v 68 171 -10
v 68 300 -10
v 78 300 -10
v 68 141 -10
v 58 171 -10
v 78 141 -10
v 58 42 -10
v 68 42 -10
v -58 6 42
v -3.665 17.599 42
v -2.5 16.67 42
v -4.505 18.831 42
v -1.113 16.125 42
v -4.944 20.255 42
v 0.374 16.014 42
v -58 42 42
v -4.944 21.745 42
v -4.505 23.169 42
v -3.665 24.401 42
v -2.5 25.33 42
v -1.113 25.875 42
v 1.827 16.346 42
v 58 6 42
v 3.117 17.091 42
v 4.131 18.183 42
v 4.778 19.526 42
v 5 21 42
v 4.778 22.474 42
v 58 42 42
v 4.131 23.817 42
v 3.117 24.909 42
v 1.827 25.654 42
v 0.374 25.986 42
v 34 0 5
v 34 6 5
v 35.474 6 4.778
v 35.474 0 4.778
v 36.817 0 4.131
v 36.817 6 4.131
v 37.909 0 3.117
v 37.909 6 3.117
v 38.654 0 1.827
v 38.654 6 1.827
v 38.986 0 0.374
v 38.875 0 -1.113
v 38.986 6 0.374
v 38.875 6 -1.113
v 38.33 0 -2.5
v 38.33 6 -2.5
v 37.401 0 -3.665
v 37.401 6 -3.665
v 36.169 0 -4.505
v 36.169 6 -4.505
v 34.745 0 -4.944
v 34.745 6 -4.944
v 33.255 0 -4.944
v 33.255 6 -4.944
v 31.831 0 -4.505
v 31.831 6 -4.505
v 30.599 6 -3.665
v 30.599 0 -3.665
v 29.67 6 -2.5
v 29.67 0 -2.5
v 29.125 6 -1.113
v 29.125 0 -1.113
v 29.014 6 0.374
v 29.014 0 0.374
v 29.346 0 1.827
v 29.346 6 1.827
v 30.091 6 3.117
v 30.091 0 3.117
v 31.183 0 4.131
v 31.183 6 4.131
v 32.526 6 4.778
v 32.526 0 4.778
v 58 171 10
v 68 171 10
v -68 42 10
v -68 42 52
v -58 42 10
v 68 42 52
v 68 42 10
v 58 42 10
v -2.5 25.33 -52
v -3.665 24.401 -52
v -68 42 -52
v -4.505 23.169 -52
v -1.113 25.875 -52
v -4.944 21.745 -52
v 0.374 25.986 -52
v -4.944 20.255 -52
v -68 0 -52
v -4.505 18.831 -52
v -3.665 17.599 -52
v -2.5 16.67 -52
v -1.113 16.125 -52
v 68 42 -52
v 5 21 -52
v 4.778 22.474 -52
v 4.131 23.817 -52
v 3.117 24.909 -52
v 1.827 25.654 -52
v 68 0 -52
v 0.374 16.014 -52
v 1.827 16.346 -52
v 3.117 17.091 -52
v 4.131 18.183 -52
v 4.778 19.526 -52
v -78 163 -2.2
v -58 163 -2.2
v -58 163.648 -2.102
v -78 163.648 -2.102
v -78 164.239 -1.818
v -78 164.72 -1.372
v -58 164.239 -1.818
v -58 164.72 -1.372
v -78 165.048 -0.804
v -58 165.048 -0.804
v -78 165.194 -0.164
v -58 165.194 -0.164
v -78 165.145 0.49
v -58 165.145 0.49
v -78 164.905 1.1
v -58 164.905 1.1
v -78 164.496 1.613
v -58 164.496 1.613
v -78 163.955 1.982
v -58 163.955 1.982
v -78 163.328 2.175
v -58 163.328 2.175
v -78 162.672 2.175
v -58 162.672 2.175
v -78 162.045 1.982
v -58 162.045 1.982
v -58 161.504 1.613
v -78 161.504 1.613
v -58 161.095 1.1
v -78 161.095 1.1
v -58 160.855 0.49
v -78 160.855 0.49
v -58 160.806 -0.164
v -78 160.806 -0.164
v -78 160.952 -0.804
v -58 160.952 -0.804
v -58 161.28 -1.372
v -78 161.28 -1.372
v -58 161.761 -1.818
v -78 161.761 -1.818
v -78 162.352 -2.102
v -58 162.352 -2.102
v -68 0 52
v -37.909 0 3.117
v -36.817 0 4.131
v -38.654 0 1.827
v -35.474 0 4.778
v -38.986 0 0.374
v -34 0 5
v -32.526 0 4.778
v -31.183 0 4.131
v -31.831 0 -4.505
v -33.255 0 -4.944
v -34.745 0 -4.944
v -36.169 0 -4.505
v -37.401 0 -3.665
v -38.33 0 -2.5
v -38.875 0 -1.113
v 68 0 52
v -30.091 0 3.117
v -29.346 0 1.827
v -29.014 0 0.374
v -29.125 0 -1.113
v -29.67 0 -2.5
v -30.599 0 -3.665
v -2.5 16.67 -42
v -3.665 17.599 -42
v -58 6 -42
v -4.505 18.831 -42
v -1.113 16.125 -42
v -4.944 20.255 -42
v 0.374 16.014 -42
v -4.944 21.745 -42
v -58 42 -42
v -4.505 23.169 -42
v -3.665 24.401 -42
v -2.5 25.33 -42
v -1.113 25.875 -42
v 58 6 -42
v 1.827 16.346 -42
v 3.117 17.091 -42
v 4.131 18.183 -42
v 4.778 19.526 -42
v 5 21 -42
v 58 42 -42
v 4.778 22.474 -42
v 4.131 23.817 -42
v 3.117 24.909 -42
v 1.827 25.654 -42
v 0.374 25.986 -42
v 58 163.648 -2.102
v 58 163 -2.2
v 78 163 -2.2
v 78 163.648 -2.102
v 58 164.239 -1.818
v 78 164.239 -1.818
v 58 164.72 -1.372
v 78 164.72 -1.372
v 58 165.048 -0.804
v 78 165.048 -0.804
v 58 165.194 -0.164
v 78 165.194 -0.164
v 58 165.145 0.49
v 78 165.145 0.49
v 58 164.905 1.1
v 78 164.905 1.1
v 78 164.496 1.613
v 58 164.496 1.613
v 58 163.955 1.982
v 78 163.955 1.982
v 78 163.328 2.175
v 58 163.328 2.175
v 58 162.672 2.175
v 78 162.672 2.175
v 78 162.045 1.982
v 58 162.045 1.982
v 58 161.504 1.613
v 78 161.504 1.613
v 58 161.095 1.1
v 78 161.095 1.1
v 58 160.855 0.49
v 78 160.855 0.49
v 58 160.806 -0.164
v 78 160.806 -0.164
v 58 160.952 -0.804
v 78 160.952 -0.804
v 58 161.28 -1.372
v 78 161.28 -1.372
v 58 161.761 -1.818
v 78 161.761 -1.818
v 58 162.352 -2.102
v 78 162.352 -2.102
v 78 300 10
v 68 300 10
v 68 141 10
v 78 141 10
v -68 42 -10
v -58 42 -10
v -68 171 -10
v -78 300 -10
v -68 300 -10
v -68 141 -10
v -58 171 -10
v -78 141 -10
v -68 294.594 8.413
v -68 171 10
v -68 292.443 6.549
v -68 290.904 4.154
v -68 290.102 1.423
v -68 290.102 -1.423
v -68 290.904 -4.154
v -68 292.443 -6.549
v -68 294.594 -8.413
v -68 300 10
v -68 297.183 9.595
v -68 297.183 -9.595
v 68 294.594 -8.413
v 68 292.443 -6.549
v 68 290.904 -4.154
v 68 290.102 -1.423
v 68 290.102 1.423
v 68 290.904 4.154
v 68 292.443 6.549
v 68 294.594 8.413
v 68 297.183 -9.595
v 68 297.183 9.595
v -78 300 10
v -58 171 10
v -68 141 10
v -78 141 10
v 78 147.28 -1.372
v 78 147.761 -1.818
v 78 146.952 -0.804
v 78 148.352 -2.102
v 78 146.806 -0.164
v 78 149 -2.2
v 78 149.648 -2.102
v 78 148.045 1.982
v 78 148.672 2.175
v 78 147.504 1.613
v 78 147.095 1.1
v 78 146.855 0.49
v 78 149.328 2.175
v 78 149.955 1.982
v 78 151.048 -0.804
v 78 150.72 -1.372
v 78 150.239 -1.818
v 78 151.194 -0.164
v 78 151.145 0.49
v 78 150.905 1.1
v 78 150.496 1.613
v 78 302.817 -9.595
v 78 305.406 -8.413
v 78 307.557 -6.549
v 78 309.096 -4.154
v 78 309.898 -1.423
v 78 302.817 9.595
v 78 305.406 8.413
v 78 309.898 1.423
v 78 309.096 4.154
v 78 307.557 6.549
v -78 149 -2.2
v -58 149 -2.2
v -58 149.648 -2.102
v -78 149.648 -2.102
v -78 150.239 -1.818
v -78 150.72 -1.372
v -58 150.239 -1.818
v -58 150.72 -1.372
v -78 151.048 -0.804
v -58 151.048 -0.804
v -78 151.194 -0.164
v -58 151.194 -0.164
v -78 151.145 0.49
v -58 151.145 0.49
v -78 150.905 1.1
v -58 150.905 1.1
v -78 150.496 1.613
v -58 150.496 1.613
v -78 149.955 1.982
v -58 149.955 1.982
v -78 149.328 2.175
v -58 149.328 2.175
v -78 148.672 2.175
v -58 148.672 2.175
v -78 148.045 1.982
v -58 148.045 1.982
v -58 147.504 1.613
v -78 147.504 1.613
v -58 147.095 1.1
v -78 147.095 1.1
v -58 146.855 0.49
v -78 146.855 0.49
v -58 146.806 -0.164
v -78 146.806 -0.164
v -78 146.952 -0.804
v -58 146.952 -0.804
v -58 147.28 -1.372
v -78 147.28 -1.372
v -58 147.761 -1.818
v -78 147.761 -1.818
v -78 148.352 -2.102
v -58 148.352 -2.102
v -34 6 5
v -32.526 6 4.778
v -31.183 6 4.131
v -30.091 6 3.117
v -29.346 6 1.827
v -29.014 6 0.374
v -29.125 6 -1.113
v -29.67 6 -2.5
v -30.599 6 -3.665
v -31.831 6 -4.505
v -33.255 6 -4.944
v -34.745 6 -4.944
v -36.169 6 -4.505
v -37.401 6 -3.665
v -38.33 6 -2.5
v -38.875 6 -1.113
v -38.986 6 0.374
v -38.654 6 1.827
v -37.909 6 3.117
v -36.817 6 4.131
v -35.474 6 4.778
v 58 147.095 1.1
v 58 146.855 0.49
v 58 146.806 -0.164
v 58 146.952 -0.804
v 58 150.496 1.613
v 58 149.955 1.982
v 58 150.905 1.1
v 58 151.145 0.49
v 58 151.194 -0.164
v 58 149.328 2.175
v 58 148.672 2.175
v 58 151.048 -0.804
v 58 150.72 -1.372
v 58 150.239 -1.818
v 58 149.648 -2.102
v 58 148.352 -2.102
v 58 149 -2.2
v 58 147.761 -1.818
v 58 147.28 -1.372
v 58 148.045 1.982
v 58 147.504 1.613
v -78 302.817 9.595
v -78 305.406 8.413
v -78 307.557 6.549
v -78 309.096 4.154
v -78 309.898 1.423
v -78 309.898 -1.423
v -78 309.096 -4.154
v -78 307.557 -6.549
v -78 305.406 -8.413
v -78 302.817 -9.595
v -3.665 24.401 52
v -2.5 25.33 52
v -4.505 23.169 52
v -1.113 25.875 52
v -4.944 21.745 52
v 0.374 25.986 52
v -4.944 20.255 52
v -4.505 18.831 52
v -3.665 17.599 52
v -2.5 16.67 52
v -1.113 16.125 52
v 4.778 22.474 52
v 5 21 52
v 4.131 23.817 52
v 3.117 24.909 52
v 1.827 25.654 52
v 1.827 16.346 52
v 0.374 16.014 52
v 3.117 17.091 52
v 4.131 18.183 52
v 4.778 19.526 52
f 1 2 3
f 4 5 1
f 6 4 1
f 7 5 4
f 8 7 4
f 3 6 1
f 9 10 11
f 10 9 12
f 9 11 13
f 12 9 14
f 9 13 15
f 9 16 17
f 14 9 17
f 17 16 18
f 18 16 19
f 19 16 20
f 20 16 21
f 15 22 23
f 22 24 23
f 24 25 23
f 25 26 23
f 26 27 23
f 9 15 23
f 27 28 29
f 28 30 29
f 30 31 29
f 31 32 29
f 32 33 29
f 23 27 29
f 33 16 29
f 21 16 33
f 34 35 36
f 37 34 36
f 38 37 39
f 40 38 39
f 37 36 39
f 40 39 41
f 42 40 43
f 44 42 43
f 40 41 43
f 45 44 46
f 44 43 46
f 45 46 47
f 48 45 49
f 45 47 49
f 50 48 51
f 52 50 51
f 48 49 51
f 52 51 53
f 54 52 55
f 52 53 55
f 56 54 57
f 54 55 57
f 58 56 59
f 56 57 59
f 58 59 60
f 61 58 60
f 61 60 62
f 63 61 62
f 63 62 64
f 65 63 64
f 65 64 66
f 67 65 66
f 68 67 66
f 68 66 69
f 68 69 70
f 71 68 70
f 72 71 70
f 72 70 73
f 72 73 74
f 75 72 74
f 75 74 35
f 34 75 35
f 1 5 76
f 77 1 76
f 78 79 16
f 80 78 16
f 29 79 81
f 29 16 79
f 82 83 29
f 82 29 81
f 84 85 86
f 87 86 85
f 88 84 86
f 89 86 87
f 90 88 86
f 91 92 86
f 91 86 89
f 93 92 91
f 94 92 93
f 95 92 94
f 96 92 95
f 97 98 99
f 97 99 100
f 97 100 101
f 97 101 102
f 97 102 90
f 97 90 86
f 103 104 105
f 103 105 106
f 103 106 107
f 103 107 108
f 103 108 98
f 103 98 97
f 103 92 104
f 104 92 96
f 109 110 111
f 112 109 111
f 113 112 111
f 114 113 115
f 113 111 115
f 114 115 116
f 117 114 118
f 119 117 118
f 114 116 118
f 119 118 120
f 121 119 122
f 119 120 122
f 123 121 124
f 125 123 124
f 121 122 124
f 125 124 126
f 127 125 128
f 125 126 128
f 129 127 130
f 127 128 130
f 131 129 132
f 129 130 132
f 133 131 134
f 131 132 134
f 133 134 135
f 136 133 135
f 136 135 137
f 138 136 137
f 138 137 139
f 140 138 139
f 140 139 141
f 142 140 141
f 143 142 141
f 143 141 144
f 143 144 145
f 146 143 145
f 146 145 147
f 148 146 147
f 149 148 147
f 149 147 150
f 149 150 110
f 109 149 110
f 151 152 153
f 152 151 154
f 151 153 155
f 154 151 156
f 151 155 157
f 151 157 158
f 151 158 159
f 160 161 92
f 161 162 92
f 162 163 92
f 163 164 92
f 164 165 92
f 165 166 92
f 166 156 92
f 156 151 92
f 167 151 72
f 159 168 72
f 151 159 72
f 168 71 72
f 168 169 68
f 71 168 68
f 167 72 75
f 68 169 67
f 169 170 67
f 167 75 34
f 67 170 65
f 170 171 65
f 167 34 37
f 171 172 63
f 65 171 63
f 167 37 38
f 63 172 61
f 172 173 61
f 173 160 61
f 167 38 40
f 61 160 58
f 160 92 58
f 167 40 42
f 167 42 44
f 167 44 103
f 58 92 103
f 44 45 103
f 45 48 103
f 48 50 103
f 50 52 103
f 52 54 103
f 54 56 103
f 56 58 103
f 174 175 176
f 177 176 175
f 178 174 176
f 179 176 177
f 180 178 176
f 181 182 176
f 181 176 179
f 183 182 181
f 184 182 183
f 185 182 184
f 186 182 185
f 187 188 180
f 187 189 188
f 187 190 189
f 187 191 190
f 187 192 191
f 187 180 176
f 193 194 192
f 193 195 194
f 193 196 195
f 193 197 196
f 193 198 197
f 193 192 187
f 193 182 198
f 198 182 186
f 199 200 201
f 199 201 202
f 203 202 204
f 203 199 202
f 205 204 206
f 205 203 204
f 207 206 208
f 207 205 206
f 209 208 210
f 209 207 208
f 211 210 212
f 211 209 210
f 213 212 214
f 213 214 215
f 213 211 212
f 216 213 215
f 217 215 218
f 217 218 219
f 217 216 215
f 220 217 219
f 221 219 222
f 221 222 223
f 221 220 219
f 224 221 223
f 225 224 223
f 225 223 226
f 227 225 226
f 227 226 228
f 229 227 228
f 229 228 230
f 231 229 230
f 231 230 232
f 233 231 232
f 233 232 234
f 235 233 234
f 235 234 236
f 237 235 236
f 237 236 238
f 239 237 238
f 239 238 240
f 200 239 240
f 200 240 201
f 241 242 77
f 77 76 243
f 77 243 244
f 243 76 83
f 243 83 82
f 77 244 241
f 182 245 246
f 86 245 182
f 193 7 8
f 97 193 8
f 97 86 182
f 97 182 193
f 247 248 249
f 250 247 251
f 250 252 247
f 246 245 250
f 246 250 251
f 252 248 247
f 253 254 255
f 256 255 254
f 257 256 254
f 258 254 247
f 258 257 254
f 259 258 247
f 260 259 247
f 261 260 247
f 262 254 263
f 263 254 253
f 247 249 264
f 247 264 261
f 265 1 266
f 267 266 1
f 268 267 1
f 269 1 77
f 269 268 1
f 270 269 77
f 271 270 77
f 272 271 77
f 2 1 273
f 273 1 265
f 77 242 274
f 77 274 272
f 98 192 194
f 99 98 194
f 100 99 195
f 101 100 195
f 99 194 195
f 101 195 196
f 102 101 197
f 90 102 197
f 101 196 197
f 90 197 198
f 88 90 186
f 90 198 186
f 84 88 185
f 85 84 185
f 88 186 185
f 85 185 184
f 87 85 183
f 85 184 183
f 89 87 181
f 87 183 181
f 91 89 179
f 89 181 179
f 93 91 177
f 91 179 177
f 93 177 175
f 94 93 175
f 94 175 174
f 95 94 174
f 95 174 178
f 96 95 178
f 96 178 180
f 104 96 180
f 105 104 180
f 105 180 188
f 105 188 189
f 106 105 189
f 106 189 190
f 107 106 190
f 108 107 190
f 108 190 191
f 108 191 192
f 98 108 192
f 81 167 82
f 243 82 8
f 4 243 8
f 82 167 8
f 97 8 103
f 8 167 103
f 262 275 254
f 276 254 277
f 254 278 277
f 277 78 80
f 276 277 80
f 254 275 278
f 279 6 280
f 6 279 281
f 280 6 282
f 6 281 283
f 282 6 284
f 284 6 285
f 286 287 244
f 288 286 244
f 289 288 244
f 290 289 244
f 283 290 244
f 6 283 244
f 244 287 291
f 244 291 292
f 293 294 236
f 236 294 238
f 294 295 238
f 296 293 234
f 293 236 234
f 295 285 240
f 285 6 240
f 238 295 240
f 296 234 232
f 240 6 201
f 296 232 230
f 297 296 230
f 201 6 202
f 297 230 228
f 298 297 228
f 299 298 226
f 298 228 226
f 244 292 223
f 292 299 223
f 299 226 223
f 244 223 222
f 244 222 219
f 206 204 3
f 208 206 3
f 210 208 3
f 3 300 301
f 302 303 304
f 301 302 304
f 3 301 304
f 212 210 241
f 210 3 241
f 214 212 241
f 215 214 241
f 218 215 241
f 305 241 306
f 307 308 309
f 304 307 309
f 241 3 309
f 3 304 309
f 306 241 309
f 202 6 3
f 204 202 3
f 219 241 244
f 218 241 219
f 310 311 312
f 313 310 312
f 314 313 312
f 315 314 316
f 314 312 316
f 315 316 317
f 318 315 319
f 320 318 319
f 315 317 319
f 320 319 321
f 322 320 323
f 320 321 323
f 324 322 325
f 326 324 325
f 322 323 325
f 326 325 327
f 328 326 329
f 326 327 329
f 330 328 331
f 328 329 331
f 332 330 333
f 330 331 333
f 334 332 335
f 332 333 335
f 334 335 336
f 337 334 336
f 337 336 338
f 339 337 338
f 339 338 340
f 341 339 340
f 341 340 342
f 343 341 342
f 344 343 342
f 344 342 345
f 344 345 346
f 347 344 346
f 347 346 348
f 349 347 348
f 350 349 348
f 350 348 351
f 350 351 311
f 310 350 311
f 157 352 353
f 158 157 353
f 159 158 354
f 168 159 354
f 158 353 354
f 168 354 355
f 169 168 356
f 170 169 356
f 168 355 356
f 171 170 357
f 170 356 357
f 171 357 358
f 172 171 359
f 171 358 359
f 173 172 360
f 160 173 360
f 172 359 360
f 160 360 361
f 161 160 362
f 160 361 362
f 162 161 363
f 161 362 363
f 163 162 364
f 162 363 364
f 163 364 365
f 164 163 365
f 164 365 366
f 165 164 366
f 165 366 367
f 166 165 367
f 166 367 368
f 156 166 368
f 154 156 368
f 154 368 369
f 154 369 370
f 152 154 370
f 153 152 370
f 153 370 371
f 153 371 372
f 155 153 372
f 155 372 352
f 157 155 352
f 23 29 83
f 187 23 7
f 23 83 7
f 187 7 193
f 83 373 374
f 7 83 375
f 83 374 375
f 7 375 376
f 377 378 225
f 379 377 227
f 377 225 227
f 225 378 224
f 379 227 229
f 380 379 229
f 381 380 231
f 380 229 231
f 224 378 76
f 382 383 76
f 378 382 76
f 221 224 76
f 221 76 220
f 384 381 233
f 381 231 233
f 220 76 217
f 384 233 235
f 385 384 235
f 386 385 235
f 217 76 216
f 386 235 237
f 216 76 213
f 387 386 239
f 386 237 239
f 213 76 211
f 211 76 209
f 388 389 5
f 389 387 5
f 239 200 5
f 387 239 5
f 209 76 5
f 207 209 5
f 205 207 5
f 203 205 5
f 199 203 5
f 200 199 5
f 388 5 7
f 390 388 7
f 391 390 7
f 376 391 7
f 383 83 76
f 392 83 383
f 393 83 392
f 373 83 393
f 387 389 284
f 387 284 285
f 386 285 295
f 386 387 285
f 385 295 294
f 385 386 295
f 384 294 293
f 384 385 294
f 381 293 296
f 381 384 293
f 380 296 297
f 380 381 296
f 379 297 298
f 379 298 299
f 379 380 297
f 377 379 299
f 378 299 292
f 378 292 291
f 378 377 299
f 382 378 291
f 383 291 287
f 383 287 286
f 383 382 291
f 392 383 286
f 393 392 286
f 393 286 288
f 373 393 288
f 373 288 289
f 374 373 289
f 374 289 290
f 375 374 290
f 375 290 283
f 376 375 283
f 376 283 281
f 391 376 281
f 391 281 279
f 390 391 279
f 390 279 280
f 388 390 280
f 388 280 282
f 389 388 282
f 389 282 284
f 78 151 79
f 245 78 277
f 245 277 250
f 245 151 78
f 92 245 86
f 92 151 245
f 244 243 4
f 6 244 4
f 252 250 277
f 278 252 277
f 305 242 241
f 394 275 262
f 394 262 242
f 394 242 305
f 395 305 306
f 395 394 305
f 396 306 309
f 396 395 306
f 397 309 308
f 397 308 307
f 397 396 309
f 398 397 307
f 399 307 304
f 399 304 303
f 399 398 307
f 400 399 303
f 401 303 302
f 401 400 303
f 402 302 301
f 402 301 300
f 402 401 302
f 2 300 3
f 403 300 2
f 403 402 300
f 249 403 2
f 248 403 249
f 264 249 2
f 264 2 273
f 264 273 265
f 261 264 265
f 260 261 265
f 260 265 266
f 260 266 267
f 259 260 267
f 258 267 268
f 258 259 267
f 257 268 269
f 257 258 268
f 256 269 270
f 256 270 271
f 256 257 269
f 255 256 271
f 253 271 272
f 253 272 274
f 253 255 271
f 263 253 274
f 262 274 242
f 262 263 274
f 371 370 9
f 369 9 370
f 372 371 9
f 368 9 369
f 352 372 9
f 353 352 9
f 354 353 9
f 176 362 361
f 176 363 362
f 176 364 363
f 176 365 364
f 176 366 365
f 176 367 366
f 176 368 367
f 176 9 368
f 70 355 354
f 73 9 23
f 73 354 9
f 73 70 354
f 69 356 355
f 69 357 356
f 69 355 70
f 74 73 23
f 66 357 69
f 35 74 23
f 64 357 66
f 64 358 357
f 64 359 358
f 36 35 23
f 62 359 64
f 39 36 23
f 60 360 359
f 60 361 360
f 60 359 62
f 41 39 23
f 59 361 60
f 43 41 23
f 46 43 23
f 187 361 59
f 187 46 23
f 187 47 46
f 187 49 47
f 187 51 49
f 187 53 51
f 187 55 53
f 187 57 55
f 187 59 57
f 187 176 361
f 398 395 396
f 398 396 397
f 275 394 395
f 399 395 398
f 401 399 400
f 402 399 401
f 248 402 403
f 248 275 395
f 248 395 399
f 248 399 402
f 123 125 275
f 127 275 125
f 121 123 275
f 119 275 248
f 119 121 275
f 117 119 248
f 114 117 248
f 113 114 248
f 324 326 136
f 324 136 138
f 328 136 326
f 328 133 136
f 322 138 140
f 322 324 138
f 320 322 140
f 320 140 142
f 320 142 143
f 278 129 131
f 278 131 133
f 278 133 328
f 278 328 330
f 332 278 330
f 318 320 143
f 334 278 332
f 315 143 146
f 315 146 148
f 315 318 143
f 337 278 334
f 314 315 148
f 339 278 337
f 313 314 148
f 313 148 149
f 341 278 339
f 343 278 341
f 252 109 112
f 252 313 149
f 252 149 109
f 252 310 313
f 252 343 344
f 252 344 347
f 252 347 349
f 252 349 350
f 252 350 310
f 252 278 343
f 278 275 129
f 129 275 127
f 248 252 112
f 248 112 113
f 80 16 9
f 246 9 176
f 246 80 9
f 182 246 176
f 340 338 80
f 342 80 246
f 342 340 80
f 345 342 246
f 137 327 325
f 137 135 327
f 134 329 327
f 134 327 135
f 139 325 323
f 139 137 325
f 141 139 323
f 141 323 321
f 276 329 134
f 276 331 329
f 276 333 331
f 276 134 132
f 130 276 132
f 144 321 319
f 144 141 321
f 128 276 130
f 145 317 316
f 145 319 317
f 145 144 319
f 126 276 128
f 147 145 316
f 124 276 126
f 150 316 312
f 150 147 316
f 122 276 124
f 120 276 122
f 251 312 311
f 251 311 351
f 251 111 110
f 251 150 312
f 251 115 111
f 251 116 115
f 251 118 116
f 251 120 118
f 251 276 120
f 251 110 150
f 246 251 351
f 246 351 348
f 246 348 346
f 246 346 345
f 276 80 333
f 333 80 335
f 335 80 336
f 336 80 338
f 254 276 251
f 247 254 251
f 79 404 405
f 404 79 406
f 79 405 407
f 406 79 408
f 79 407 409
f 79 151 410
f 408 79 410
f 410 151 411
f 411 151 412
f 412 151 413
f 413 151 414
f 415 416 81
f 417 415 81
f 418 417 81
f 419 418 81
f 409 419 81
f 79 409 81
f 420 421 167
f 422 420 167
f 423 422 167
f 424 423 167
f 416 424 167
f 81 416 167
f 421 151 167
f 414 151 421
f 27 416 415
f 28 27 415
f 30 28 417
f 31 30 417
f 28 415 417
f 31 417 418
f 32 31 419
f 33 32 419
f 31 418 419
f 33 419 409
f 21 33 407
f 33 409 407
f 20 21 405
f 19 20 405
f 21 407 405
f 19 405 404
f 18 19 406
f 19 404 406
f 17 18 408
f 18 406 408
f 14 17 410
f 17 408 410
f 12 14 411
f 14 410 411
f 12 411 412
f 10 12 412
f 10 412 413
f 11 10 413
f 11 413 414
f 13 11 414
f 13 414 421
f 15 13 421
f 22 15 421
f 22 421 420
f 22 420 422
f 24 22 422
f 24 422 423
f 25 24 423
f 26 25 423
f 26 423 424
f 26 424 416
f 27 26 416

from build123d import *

# Parameters (mm, degrees)
SKETCH_1_W                      = 136
SKETCH_1_H                      = 104
EXTRUDE_1_DEPTH                 = 42
SKETCH_2_W                      = 116
SKETCH_2_H                      = 84
CUT_EXTRUDE_1_DEPTH             = 36
CUT_EXTRUDE_2_REACH             = 94.865
SKETCH_3_R                      = 5
SKETCH_5_R                      = 5
CUT_EXTRUDE_4_DEPTH             = 104
SKETCH_6_W                      = 10
SKETCH_6_H                      = 20
EXTRUDE_2_DEPTH                 = 258
SKETCH_8_W                      = 20
SKETCH_8_H                      = 30
EXTRUDE_4_DEPTH                 = 10
SKETCH_9_W                      = 10
SKETCH_9_H                      = 20
EXTRUDE_5_DEPTH                 = 129
SKETCH_10_W                     = 20
SKETCH_10_H                     = 30
EXTRUDE_6_DEPTH                 = 10
SKETCH_12_W                     = 10
SKETCH_12_H                     = 20
EXTRUDE_8_DEPTH                 = 129
SKETCH_13_W                     = 20
SKETCH_13_H                     = 129
CUT_EXTRUDE_5_DEPTH             = 10
SKETCH_14_W                     = 20
SKETCH_14_H                     = 129
CUT_EXTRUDE_6_DEPTH             = 10
SKETCH_15_R                     = 10
EXTRUDE_9_DEPTH                 = 156
CUT_EXTRUDE_7_REACH             = 344.491
SKETCH_16_R                     = 2.2
CUT_EXTRUDE_7_DIRECTION_2_DEPTH = 136


with BuildPart() as part:
    # 草图1 → 凸台-拉伸1 (new body)
    with BuildSketch(Plane(origin=(0, 0, 0), x_dir=(1, 0, 0), z_dir=(0, 1, 0))):
        Rectangle(SKETCH_1_W, SKETCH_1_H)
    extrude(amount=EXTRUDE_1_DEPTH)

    # 草图2 → 切除-拉伸1 (cut)
    with BuildSketch(Plane(origin=(0, 42, 0), x_dir=(1, 0, 0), z_dir=(0, 1, 0))):
        Rectangle(SKETCH_2_W, SKETCH_2_H)
    extrude(amount=-CUT_EXTRUDE_1_DEPTH, mode=Mode.SUBTRACT)

    # 草图3 → 切除-拉伸2 (cut, up to next)
    with BuildSketch(Plane(origin=(0, 6, 0), x_dir=(1, 0, 0), z_dir=(0, 1, 0)), mode=Mode.PRIVATE) as cut_extrude_2_sk1:
        with Locations(Location((-34, 0, 0), (0, 0, 270))):
            Circle(SKETCH_3_R)
    cut_extrude_2_tool1 = extrude(cut_extrude_2_sk1.sketch, amount=-CUT_EXTRUDE_2_REACH, mode=Mode.PRIVATE) & part.part
    # 草图3 → 切除-拉伸2 (cut, up to next)
    with BuildSketch(Plane(origin=(0, 6, 0), x_dir=(1, 0, 0), z_dir=(0, 1, 0)), mode=Mode.PRIVATE) as cut_extrude_2_sk2:
        with Locations(Location((34, 0, 0), (0, 0, 270))):
            Circle(SKETCH_3_R)
    cut_extrude_2_tool2 = extrude(cut_extrude_2_sk2.sketch, amount=-CUT_EXTRUDE_2_REACH, mode=Mode.PRIVATE) & part.part
    add(cut_extrude_2_tool1.solids().sort_by_distance((-34, 6, 0))[0], mode=Mode.SUBTRACT)
    add(cut_extrude_2_tool2.solids().sort_by_distance((34, 6, 0))[0], mode=Mode.SUBTRACT)

    # 草图5 → 切除-拉伸4 (cut)
    with BuildSketch(Plane.XY.offset(52)):
        with Locations((0, 21)):
            Circle(SKETCH_5_R)
    extrude(amount=-CUT_EXTRUDE_4_DEPTH, mode=Mode.SUBTRACT)

    # 草图6 → 凸台-拉伸2 (add)
    with BuildSketch(Plane(origin=(0, 42, 0), x_dir=(1, 0, 0), z_dir=(0, 1, 0))):
        with Locations((-63, 0)):
            Rectangle(SKETCH_6_W, SKETCH_6_H)
        with Locations((63, 0)):
            Rectangle(SKETCH_6_W, SKETCH_6_H)
    extrude(amount=EXTRUDE_2_DEPTH)

    # 草图8 → 凸台-拉伸4 (add)
    with BuildSketch(Plane.ZY.offset(68)):
        with Locations((0, 156)):
            Rectangle(SKETCH_8_W, SKETCH_8_H)
    extrude(amount=EXTRUDE_4_DEPTH)

    # 草图9 → 凸台-拉伸5 (add)
    with BuildSketch(Plane(origin=(0, 171, 0), x_dir=(1, 0, 0), z_dir=(0, 1, 0))):
        with Locations((-73, 0)):
            Rectangle(SKETCH_9_W, SKETCH_9_H)
    extrude(amount=EXTRUDE_5_DEPTH)

    # 草图10 → 凸台-拉伸6 (add)
    with BuildSketch(Plane(origin=(68, 0, 0), x_dir=(0, 0, -1), z_dir=(1, 0, 0))):
        with Locations((0, 156)):
            Rectangle(SKETCH_10_W, SKETCH_10_H)
    extrude(amount=EXTRUDE_6_DEPTH)

    # 草图12 → 凸台-拉伸8 (add)
    with BuildSketch(Plane(origin=(0, 171, 0), x_dir=(1, 0, 0), z_dir=(0, 1, 0))):
        with Locations((73, 0)):
            Rectangle(SKETCH_12_W, SKETCH_12_H)
    extrude(amount=EXTRUDE_8_DEPTH)

    # 草图13 → 切除-拉伸5 (cut)
    with BuildSketch(Plane(origin=(-58, 0, 0), x_dir=(0, 0, -1), z_dir=(1, 0, 0))):
        with Locations((0, 235.5)):
            Rectangle(SKETCH_13_W, SKETCH_13_H)
    extrude(amount=-CUT_EXTRUDE_5_DEPTH, mode=Mode.SUBTRACT)

    # 草图14 → 切除-拉伸6 (cut)
    with BuildSketch(Plane.ZY.offset(-58)):
        with Locations((0, 235.5)):
            Rectangle(SKETCH_14_W, SKETCH_14_H)
    extrude(amount=-CUT_EXTRUDE_6_DEPTH, mode=Mode.SUBTRACT)

    # 草图15 → 凸台-拉伸9 (add)
    with BuildSketch(Plane.ZY.offset(78)):
        with Locations((0, 300)):
            Circle(SKETCH_15_R)
    extrude(amount=-EXTRUDE_9_DEPTH)

    # 草图16 → 切除-拉伸7 (cut, up to next)
    with BuildSketch(Plane(origin=(-58, 0, 0), x_dir=(0, 0, -1), z_dir=(1, 0, 0)), mode=Mode.PRIVATE) as cut_extrude_7_sk1:
        with Locations((0, 163)):
            Circle(SKETCH_16_R)
    cut_extrude_7_tool1 = extrude(cut_extrude_7_sk1.sketch, amount=-CUT_EXTRUDE_7_REACH, mode=Mode.PRIVATE) & part.part
    # 草图16 → 切除-拉伸7 (cut, up to next)
    with BuildSketch(Plane(origin=(-58, 0, 0), x_dir=(0, 0, -1), z_dir=(1, 0, 0)), mode=Mode.PRIVATE) as cut_extrude_7_sk2:
        with Locations((0, 149)):
            Circle(SKETCH_16_R)
    cut_extrude_7_tool2 = extrude(cut_extrude_7_sk2.sketch, amount=-CUT_EXTRUDE_7_REACH, mode=Mode.PRIVATE) & part.part
    add(cut_extrude_7_tool1.solids().sort_by_distance((-58, 163, 0))[0], mode=Mode.SUBTRACT)
    add(cut_extrude_7_tool2.solids().sort_by_distance((-58, 149, 0))[0], mode=Mode.SUBTRACT)

    # 草图16 → 切除-拉伸7 direction 2 (cut)
    with BuildSketch(Plane(origin=(-58, 0, 0), x_dir=(0, 0, -1), z_dir=(1, 0, 0))):
        with Locations((0, 163)):
            Circle(SKETCH_16_R)
        with Locations((0, 149)):
            Circle(SKETCH_16_R)
    extrude(amount=CUT_EXTRUDE_7_DIRECTION_2_DEPTH, mode=Mode.SUBTRACT)


solid = part.part
